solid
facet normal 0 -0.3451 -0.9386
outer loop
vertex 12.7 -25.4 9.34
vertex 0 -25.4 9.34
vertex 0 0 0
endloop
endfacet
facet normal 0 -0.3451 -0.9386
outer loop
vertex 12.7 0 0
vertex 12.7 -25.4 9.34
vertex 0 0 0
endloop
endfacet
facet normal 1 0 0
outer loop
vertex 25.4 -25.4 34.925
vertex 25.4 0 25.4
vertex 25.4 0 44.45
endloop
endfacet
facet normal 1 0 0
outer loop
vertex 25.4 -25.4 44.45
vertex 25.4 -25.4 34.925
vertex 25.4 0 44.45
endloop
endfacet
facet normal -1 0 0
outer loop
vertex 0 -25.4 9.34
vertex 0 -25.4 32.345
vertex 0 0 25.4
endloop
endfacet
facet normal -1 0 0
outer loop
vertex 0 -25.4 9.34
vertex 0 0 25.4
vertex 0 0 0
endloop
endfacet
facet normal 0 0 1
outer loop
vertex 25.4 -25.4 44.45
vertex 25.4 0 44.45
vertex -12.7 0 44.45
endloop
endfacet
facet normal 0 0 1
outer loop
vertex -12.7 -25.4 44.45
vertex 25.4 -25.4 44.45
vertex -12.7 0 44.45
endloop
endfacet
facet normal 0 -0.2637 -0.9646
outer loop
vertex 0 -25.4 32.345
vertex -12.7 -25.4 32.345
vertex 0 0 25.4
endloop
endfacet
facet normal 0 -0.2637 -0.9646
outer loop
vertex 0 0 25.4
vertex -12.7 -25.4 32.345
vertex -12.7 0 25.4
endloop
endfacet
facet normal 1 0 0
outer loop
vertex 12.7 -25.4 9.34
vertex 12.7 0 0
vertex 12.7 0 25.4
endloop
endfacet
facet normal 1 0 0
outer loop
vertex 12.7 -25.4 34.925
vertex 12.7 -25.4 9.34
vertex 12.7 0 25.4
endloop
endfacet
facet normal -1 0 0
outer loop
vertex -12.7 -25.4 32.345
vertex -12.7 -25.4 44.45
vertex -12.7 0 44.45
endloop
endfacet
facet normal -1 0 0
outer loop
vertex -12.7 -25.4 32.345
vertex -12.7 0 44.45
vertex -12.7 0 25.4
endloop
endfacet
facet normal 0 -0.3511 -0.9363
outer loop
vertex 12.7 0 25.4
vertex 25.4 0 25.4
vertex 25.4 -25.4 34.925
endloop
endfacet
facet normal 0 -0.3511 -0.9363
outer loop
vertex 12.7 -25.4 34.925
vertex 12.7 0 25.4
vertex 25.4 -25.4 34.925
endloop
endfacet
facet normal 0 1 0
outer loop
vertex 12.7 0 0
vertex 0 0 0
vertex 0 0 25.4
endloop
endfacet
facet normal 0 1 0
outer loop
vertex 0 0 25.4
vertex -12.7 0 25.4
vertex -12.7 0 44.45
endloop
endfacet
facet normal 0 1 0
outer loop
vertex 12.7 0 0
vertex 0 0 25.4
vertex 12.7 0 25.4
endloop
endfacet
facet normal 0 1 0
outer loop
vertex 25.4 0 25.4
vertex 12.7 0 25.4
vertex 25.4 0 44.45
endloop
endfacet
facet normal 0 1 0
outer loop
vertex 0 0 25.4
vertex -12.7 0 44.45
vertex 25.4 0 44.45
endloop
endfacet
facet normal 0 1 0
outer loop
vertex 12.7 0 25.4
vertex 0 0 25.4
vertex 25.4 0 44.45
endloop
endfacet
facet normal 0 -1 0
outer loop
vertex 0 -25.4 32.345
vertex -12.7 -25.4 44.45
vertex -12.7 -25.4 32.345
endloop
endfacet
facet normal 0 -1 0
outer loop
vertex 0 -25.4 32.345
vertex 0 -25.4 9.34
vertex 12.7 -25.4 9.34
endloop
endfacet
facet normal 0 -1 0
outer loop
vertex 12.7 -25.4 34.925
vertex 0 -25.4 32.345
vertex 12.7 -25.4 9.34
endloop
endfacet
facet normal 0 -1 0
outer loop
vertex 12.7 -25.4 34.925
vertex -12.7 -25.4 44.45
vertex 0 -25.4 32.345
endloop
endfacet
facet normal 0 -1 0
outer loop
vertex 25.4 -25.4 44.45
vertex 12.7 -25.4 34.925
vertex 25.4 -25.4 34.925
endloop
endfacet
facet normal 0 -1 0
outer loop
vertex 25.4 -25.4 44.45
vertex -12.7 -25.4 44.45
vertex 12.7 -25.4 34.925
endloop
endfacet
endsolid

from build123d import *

# Parameters (mm, degrees)
F1_DEPTH = 25.4
F3_DEPTH = 25.4
F5_DEPTH = 12.7
F7_DEPTH = 12.7


with BuildPart() as f1:
    # F0 (on Front) → F1 (new body)
    with BuildSketch(Plane.XZ):
        Polygon((-12.7, 25.4), (0, 25.4), (0, 0), (12.7, 0), (12.7, 25.4), (25.4, 25.4), (25.4, 44.45), (-12.7, 44.45), align=None)
    extrude(amount=F1_DEPTH)

    # F2 (on face) → F3 (cut)
    with BuildSketch(Plane(origin=(0, 0, 0), x_dir=(0, -1, 0), z_dir=(-1, 0, 0))):
        Polygon((25.4, 9.339999), (0, 0), (25.4, 0), align=None)
    extrude(amount=-F3_DEPTH, mode=Mode.SUBTRACT)

    # F4 (on face) → F5 (cut)
    with BuildSketch(Plane(origin=(-12.7, 0, 0), x_dir=(0, -1, 0), z_dir=(-1, 0, 0))):
        Polygon((25.4, 25.4), (25.4, 32.345079), (0, 25.4), align=None)
    extrude(amount=-F5_DEPTH, mode=Mode.SUBTRACT)

    # F6 (on face) → F7 (cut)
    with BuildSketch(Plane.YZ.offset(25.4)):
        Polygon((-25.4, 25.4), (0, 25.4), (-25.4, 34.925), align=None)
    extrude(amount=-F7_DEPTH, mode=Mode.SUBTRACT)


solid = f1.part
